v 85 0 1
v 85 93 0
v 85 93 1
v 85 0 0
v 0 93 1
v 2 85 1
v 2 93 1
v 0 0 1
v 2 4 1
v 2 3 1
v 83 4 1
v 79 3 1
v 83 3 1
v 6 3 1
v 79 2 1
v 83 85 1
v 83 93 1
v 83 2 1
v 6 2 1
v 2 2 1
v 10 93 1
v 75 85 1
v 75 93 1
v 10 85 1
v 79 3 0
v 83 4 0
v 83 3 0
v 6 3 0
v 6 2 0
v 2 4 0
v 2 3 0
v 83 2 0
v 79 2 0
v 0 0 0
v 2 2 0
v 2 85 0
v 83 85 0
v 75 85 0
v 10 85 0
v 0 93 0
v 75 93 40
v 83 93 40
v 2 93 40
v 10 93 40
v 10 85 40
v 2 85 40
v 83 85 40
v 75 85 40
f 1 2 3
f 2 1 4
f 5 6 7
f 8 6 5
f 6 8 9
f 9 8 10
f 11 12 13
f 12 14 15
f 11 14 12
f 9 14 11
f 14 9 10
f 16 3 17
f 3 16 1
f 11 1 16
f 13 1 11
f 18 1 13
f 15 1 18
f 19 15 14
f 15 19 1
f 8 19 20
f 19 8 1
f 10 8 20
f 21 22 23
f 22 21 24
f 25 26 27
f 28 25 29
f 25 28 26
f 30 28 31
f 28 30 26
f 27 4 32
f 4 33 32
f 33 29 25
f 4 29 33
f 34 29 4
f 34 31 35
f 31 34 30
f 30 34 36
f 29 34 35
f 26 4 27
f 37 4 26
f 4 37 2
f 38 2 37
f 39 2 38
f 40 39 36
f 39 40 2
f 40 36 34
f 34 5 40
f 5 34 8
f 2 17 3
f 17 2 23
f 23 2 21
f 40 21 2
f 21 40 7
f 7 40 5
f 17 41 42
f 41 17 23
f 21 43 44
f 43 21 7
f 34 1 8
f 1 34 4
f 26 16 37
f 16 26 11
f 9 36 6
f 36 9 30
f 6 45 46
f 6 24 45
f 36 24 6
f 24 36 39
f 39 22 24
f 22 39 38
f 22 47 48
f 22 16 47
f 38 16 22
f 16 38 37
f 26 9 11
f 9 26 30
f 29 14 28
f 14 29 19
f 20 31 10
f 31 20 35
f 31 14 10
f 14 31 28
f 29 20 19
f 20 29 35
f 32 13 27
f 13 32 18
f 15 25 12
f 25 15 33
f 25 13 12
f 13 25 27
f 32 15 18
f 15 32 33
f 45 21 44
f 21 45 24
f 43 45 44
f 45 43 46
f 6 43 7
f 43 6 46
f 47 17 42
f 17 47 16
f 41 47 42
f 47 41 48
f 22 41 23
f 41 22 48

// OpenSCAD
/* [Dimensions] */
// Base Length
LEN_BASE = 60;// [20:60]
// Base width
WIDTH = 80;//[40:120]
// Thickness of Base and Back
THICK = 2; //[1:4]
// height of Back
HEIGHT = 40; //[30:60]
// Number of Steps
STEPS_NO = 5;//[1:8]
// Strength of Steps
STRENGTH = 2; //[1:5]
// Space between Steps
STEPS_SPACE = 10;//[2:10]
// radius of curved corners
cornerRad = 3; //radius of curved corners

// -----------------------------
// Define Modules
// -----------------------------

module frame(width,depth, height, thickness){
    difference(){
cube([width+4,depth+12,thickness]);//Base
translate([2,4,0])cube([width,depth,thickness]);
translate([2,2,0])cube([4,1,thickness]); //Right whole
translate([width-02,2,0])cube([4,1,thickness]); //Left whole   
     
    }
translate([2,depth+4,0])    
cube([8,8,40]);
    
translate([width-6,depth+4,0])    
cube([8,8,40]);
}



module housing(width,depth, height, thickness){
cube([width,depth,thickness]);//Base
translate([0,0,height])cube([width,depth,thickness]);//Top
cube([thickness,depth,height]);//Wall left
    translate([width,0,0])
    difference() {
    cube([thickness,depth,height]);//Wall right
    translate([00,20,30])rotate([0,90,0])cylinder(h=thickness*2,d=20);
};

cube([width,thickness,height]);//Back

}

module mirror(width, length, heigth, thickness){
        cube([width,length,thickness]);//Base
}

module base(width, length, heigth, thickness){
    
    difference(){
        cube([width,length,thickness*3]);//Base
        translate([thickness,thickness,thickness])mirror(width, length, heigth, thickness);
        
        };    
    
}

module bar(width, length, thickness){
    
    cube([thickness,length, thickness*3]);
    difference(){
    cube([thickness*3,thickness*3,thickness*3]);
        translate([0,thickness*2, 0])
        cube([thickness*2,thickness*2,thickness*3]);
    }
    translate([0,length-thickness*3, 0])
    difference(){
    cube([thickness*3,thickness*3,thickness*3]);
        translate([0,-thickness, 0])
        cube([thickness*2,thickness*2,thickness*3]);
        translate([0-2,thickness, 0])cube([1,1,thickness*3]);
    }
}

module body(width, length, heigth, thickness){
difference() {
cube([width*2^0.5,length*2^0.5,thickness]);//Base

}

difference() {
    cube([width,thickness,heigth]);//Back
    translate([width/2,0,heigth])rotate([90,0,0])scale([(width-20)/40,width/60*(heigth/40)])cylinder(  10, d=45, center=true);//Back-Cut-Out
    
    };
rotate([0,0,90])translate([thickness,-width,thickness])
corner(heigth/10,width);//Front Corner Rounding
cube([width,thickness,heigth/6]);// Fill the gap bewteen roundings on base
rotate([90,0,0])cube([width,thickness,heigth/2+5]);//Back Stabilizer
rotate([0,270,90])translate([thickness,-width,0])
corner(heigth/10,width);//Back Corner Rounding

translate([width/2,length,0])cylinder(  thickness, d=5);//Front Indicator

translate([0,length,thickness])
steps(STEPS_NO,STRENGTH,STEPS_SPACE,width);

translate([width-4,-20,0])//Back left
difference() { //Back support
    cube([4,20,heigth]);
    translate([0,-heigth*1.6+20,heigth])rotate([0,90,0])scale([1,1])cylinder(  heigth, d=(3.2*heigth), center=true);//Back-Cut-Out
    
    };

translate([0,-20,0])//Back right
difference() { //Back support
    cube([4,20,heigth]);
    translate([0,-heigth*1.6+20,heigth])rotate([0,90,0])scale([(1),1])cylinder(  heigth, d=(3.2*heigth), center=true);//Back-Cut-Out
    
    };

}


module steps(number, strength, space, width){
    for (i = [0 : number-1]){
   translate([0,-(strength)-space*i,0])cube([width,strength,strength]);
    }
    }

module corner(width,depth){
difference() {
cube([width, depth, width]);
rotate([270,0,0])translate([width,-width,0])cylinder(depth, r=width, $fn=100);
}};

// -----------------------------
// Put Components together
// -----------------------------

// housing(400,400,400,5);

frame(81,81,40,1);
